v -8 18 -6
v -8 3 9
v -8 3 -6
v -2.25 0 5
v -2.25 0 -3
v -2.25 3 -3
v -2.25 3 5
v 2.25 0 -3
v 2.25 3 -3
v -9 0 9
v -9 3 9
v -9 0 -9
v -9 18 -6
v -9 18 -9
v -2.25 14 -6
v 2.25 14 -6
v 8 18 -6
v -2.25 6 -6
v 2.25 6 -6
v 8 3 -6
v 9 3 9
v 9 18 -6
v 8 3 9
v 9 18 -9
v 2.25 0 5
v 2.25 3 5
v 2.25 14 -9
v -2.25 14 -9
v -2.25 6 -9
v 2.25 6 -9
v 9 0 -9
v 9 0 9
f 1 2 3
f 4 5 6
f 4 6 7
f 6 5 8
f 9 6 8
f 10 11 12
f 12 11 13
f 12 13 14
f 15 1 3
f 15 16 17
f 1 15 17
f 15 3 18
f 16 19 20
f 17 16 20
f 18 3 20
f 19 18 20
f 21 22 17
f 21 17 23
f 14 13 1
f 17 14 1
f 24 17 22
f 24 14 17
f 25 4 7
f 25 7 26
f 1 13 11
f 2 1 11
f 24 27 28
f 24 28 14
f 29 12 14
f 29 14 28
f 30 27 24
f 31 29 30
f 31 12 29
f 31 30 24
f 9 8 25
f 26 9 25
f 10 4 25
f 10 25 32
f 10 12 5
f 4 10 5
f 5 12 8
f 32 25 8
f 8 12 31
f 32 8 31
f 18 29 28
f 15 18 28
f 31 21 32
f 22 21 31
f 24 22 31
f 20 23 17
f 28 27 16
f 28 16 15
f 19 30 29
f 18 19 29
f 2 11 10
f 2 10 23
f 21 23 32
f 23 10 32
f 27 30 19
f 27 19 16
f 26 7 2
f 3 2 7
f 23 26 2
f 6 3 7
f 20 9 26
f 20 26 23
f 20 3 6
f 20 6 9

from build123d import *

# Parameters (mm, degrees)
SKETCH1_W           = 18
SKETCH1_H           = 18
BOSS_EXTRUDE1_DEPTH = 3
SKETCH3_W           = 4.5
SKETCH3_H           = 8
CUT_EXTRUDE1_DEPTH  = 14.076696831
SKETCH6_W           = 18
SKETCH6_H           = 3
BOSS_EXTRUDE3_DEPTH = 15
SKETCH7_W           = 4.5
SKETCH7_H           = 8
CUT_EXTRUDE2_DEPTH  = 28
BOSS_EXTRUDE4_DEPTH = 1
CUT_EXTRUDE3_REACH  = 24.045
SKETCH10_W          = 4.5
SKETCH10_H          = 8


with BuildPart() as part:
    # Sketch1 → Boss-Extrude1 (new body)
    with BuildSketch(Plane(origin=(0, 0, 0), x_dir=(1, 0, 0), z_dir=(0, 1, 0))):
        Rectangle(SKETCH1_W, SKETCH1_H)
    boss_extrude1 = extrude(amount=BOSS_EXTRUDE1_DEPTH)

    # Sketch3 → Cut-Extrude1 (cut, through all)
    with BuildSketch(Plane.XZ):
        with Locations((0, 1)):
            Rectangle(SKETCH3_W, SKETCH3_H)
    extrude(amount=-CUT_EXTRUDE1_DEPTH, mode=Mode.SUBTRACT)

    # Sketch6 → Boss-Extrude3 (add)
    with BuildSketch(Plane(origin=(0, 3, 0), x_dir=(1, 0, 0), z_dir=(0, 1, 0))):
        with Locations((0, 7.5)):
            Rectangle(SKETCH6_W, SKETCH6_H)
    extrude(amount=BOSS_EXTRUDE3_DEPTH)

    # Sketch7 → Cut-Extrude2 (cut, through all)
    with BuildSketch(Plane(origin=(0, 0, -9), x_dir=(-1, 0, 0), z_dir=(0, 0, -1))):
        with Locations((0, 10)):
            Rectangle(SKETCH7_W, SKETCH7_H)
    extrude(amount=-CUT_EXTRUDE2_DEPTH, mode=Mode.SUBTRACT)

    # Sketch9 → Boss-Extrude4 (add)
    with BuildSketch(Plane.ZY.offset(9)):
        Polygon((-6, 18), (9, 3), (-6, 3), align=None)
    boss_extrude4 = extrude(amount=-BOSS_EXTRUDE4_DEPTH)

    # Mirror1: Boss-Extrude1, Boss-Extrude4 across plane
    add(boss_extrude1.mirror(Plane.ZY))
    add(boss_extrude4.mirror(Plane.ZY))

    # Sketch10 → Cut-Extrude3 (cut, up to next)
    with BuildSketch(Plane.XZ, mode=Mode.PRIVATE) as cut_extrude3_sk1:
        with Locations((0, 1)):
            Rectangle(SKETCH10_W, SKETCH10_H)
    cut_extrude3_tool1 = extrude(cut_extrude3_sk1.sketch, amount=-CUT_EXTRUDE3_REACH, mode=Mode.PRIVATE) & part.part
    add(cut_extrude3_tool1.solids().sort_by_distance((0, 0, 1))[0], mode=Mode.SUBTRACT)


solid = part.part
